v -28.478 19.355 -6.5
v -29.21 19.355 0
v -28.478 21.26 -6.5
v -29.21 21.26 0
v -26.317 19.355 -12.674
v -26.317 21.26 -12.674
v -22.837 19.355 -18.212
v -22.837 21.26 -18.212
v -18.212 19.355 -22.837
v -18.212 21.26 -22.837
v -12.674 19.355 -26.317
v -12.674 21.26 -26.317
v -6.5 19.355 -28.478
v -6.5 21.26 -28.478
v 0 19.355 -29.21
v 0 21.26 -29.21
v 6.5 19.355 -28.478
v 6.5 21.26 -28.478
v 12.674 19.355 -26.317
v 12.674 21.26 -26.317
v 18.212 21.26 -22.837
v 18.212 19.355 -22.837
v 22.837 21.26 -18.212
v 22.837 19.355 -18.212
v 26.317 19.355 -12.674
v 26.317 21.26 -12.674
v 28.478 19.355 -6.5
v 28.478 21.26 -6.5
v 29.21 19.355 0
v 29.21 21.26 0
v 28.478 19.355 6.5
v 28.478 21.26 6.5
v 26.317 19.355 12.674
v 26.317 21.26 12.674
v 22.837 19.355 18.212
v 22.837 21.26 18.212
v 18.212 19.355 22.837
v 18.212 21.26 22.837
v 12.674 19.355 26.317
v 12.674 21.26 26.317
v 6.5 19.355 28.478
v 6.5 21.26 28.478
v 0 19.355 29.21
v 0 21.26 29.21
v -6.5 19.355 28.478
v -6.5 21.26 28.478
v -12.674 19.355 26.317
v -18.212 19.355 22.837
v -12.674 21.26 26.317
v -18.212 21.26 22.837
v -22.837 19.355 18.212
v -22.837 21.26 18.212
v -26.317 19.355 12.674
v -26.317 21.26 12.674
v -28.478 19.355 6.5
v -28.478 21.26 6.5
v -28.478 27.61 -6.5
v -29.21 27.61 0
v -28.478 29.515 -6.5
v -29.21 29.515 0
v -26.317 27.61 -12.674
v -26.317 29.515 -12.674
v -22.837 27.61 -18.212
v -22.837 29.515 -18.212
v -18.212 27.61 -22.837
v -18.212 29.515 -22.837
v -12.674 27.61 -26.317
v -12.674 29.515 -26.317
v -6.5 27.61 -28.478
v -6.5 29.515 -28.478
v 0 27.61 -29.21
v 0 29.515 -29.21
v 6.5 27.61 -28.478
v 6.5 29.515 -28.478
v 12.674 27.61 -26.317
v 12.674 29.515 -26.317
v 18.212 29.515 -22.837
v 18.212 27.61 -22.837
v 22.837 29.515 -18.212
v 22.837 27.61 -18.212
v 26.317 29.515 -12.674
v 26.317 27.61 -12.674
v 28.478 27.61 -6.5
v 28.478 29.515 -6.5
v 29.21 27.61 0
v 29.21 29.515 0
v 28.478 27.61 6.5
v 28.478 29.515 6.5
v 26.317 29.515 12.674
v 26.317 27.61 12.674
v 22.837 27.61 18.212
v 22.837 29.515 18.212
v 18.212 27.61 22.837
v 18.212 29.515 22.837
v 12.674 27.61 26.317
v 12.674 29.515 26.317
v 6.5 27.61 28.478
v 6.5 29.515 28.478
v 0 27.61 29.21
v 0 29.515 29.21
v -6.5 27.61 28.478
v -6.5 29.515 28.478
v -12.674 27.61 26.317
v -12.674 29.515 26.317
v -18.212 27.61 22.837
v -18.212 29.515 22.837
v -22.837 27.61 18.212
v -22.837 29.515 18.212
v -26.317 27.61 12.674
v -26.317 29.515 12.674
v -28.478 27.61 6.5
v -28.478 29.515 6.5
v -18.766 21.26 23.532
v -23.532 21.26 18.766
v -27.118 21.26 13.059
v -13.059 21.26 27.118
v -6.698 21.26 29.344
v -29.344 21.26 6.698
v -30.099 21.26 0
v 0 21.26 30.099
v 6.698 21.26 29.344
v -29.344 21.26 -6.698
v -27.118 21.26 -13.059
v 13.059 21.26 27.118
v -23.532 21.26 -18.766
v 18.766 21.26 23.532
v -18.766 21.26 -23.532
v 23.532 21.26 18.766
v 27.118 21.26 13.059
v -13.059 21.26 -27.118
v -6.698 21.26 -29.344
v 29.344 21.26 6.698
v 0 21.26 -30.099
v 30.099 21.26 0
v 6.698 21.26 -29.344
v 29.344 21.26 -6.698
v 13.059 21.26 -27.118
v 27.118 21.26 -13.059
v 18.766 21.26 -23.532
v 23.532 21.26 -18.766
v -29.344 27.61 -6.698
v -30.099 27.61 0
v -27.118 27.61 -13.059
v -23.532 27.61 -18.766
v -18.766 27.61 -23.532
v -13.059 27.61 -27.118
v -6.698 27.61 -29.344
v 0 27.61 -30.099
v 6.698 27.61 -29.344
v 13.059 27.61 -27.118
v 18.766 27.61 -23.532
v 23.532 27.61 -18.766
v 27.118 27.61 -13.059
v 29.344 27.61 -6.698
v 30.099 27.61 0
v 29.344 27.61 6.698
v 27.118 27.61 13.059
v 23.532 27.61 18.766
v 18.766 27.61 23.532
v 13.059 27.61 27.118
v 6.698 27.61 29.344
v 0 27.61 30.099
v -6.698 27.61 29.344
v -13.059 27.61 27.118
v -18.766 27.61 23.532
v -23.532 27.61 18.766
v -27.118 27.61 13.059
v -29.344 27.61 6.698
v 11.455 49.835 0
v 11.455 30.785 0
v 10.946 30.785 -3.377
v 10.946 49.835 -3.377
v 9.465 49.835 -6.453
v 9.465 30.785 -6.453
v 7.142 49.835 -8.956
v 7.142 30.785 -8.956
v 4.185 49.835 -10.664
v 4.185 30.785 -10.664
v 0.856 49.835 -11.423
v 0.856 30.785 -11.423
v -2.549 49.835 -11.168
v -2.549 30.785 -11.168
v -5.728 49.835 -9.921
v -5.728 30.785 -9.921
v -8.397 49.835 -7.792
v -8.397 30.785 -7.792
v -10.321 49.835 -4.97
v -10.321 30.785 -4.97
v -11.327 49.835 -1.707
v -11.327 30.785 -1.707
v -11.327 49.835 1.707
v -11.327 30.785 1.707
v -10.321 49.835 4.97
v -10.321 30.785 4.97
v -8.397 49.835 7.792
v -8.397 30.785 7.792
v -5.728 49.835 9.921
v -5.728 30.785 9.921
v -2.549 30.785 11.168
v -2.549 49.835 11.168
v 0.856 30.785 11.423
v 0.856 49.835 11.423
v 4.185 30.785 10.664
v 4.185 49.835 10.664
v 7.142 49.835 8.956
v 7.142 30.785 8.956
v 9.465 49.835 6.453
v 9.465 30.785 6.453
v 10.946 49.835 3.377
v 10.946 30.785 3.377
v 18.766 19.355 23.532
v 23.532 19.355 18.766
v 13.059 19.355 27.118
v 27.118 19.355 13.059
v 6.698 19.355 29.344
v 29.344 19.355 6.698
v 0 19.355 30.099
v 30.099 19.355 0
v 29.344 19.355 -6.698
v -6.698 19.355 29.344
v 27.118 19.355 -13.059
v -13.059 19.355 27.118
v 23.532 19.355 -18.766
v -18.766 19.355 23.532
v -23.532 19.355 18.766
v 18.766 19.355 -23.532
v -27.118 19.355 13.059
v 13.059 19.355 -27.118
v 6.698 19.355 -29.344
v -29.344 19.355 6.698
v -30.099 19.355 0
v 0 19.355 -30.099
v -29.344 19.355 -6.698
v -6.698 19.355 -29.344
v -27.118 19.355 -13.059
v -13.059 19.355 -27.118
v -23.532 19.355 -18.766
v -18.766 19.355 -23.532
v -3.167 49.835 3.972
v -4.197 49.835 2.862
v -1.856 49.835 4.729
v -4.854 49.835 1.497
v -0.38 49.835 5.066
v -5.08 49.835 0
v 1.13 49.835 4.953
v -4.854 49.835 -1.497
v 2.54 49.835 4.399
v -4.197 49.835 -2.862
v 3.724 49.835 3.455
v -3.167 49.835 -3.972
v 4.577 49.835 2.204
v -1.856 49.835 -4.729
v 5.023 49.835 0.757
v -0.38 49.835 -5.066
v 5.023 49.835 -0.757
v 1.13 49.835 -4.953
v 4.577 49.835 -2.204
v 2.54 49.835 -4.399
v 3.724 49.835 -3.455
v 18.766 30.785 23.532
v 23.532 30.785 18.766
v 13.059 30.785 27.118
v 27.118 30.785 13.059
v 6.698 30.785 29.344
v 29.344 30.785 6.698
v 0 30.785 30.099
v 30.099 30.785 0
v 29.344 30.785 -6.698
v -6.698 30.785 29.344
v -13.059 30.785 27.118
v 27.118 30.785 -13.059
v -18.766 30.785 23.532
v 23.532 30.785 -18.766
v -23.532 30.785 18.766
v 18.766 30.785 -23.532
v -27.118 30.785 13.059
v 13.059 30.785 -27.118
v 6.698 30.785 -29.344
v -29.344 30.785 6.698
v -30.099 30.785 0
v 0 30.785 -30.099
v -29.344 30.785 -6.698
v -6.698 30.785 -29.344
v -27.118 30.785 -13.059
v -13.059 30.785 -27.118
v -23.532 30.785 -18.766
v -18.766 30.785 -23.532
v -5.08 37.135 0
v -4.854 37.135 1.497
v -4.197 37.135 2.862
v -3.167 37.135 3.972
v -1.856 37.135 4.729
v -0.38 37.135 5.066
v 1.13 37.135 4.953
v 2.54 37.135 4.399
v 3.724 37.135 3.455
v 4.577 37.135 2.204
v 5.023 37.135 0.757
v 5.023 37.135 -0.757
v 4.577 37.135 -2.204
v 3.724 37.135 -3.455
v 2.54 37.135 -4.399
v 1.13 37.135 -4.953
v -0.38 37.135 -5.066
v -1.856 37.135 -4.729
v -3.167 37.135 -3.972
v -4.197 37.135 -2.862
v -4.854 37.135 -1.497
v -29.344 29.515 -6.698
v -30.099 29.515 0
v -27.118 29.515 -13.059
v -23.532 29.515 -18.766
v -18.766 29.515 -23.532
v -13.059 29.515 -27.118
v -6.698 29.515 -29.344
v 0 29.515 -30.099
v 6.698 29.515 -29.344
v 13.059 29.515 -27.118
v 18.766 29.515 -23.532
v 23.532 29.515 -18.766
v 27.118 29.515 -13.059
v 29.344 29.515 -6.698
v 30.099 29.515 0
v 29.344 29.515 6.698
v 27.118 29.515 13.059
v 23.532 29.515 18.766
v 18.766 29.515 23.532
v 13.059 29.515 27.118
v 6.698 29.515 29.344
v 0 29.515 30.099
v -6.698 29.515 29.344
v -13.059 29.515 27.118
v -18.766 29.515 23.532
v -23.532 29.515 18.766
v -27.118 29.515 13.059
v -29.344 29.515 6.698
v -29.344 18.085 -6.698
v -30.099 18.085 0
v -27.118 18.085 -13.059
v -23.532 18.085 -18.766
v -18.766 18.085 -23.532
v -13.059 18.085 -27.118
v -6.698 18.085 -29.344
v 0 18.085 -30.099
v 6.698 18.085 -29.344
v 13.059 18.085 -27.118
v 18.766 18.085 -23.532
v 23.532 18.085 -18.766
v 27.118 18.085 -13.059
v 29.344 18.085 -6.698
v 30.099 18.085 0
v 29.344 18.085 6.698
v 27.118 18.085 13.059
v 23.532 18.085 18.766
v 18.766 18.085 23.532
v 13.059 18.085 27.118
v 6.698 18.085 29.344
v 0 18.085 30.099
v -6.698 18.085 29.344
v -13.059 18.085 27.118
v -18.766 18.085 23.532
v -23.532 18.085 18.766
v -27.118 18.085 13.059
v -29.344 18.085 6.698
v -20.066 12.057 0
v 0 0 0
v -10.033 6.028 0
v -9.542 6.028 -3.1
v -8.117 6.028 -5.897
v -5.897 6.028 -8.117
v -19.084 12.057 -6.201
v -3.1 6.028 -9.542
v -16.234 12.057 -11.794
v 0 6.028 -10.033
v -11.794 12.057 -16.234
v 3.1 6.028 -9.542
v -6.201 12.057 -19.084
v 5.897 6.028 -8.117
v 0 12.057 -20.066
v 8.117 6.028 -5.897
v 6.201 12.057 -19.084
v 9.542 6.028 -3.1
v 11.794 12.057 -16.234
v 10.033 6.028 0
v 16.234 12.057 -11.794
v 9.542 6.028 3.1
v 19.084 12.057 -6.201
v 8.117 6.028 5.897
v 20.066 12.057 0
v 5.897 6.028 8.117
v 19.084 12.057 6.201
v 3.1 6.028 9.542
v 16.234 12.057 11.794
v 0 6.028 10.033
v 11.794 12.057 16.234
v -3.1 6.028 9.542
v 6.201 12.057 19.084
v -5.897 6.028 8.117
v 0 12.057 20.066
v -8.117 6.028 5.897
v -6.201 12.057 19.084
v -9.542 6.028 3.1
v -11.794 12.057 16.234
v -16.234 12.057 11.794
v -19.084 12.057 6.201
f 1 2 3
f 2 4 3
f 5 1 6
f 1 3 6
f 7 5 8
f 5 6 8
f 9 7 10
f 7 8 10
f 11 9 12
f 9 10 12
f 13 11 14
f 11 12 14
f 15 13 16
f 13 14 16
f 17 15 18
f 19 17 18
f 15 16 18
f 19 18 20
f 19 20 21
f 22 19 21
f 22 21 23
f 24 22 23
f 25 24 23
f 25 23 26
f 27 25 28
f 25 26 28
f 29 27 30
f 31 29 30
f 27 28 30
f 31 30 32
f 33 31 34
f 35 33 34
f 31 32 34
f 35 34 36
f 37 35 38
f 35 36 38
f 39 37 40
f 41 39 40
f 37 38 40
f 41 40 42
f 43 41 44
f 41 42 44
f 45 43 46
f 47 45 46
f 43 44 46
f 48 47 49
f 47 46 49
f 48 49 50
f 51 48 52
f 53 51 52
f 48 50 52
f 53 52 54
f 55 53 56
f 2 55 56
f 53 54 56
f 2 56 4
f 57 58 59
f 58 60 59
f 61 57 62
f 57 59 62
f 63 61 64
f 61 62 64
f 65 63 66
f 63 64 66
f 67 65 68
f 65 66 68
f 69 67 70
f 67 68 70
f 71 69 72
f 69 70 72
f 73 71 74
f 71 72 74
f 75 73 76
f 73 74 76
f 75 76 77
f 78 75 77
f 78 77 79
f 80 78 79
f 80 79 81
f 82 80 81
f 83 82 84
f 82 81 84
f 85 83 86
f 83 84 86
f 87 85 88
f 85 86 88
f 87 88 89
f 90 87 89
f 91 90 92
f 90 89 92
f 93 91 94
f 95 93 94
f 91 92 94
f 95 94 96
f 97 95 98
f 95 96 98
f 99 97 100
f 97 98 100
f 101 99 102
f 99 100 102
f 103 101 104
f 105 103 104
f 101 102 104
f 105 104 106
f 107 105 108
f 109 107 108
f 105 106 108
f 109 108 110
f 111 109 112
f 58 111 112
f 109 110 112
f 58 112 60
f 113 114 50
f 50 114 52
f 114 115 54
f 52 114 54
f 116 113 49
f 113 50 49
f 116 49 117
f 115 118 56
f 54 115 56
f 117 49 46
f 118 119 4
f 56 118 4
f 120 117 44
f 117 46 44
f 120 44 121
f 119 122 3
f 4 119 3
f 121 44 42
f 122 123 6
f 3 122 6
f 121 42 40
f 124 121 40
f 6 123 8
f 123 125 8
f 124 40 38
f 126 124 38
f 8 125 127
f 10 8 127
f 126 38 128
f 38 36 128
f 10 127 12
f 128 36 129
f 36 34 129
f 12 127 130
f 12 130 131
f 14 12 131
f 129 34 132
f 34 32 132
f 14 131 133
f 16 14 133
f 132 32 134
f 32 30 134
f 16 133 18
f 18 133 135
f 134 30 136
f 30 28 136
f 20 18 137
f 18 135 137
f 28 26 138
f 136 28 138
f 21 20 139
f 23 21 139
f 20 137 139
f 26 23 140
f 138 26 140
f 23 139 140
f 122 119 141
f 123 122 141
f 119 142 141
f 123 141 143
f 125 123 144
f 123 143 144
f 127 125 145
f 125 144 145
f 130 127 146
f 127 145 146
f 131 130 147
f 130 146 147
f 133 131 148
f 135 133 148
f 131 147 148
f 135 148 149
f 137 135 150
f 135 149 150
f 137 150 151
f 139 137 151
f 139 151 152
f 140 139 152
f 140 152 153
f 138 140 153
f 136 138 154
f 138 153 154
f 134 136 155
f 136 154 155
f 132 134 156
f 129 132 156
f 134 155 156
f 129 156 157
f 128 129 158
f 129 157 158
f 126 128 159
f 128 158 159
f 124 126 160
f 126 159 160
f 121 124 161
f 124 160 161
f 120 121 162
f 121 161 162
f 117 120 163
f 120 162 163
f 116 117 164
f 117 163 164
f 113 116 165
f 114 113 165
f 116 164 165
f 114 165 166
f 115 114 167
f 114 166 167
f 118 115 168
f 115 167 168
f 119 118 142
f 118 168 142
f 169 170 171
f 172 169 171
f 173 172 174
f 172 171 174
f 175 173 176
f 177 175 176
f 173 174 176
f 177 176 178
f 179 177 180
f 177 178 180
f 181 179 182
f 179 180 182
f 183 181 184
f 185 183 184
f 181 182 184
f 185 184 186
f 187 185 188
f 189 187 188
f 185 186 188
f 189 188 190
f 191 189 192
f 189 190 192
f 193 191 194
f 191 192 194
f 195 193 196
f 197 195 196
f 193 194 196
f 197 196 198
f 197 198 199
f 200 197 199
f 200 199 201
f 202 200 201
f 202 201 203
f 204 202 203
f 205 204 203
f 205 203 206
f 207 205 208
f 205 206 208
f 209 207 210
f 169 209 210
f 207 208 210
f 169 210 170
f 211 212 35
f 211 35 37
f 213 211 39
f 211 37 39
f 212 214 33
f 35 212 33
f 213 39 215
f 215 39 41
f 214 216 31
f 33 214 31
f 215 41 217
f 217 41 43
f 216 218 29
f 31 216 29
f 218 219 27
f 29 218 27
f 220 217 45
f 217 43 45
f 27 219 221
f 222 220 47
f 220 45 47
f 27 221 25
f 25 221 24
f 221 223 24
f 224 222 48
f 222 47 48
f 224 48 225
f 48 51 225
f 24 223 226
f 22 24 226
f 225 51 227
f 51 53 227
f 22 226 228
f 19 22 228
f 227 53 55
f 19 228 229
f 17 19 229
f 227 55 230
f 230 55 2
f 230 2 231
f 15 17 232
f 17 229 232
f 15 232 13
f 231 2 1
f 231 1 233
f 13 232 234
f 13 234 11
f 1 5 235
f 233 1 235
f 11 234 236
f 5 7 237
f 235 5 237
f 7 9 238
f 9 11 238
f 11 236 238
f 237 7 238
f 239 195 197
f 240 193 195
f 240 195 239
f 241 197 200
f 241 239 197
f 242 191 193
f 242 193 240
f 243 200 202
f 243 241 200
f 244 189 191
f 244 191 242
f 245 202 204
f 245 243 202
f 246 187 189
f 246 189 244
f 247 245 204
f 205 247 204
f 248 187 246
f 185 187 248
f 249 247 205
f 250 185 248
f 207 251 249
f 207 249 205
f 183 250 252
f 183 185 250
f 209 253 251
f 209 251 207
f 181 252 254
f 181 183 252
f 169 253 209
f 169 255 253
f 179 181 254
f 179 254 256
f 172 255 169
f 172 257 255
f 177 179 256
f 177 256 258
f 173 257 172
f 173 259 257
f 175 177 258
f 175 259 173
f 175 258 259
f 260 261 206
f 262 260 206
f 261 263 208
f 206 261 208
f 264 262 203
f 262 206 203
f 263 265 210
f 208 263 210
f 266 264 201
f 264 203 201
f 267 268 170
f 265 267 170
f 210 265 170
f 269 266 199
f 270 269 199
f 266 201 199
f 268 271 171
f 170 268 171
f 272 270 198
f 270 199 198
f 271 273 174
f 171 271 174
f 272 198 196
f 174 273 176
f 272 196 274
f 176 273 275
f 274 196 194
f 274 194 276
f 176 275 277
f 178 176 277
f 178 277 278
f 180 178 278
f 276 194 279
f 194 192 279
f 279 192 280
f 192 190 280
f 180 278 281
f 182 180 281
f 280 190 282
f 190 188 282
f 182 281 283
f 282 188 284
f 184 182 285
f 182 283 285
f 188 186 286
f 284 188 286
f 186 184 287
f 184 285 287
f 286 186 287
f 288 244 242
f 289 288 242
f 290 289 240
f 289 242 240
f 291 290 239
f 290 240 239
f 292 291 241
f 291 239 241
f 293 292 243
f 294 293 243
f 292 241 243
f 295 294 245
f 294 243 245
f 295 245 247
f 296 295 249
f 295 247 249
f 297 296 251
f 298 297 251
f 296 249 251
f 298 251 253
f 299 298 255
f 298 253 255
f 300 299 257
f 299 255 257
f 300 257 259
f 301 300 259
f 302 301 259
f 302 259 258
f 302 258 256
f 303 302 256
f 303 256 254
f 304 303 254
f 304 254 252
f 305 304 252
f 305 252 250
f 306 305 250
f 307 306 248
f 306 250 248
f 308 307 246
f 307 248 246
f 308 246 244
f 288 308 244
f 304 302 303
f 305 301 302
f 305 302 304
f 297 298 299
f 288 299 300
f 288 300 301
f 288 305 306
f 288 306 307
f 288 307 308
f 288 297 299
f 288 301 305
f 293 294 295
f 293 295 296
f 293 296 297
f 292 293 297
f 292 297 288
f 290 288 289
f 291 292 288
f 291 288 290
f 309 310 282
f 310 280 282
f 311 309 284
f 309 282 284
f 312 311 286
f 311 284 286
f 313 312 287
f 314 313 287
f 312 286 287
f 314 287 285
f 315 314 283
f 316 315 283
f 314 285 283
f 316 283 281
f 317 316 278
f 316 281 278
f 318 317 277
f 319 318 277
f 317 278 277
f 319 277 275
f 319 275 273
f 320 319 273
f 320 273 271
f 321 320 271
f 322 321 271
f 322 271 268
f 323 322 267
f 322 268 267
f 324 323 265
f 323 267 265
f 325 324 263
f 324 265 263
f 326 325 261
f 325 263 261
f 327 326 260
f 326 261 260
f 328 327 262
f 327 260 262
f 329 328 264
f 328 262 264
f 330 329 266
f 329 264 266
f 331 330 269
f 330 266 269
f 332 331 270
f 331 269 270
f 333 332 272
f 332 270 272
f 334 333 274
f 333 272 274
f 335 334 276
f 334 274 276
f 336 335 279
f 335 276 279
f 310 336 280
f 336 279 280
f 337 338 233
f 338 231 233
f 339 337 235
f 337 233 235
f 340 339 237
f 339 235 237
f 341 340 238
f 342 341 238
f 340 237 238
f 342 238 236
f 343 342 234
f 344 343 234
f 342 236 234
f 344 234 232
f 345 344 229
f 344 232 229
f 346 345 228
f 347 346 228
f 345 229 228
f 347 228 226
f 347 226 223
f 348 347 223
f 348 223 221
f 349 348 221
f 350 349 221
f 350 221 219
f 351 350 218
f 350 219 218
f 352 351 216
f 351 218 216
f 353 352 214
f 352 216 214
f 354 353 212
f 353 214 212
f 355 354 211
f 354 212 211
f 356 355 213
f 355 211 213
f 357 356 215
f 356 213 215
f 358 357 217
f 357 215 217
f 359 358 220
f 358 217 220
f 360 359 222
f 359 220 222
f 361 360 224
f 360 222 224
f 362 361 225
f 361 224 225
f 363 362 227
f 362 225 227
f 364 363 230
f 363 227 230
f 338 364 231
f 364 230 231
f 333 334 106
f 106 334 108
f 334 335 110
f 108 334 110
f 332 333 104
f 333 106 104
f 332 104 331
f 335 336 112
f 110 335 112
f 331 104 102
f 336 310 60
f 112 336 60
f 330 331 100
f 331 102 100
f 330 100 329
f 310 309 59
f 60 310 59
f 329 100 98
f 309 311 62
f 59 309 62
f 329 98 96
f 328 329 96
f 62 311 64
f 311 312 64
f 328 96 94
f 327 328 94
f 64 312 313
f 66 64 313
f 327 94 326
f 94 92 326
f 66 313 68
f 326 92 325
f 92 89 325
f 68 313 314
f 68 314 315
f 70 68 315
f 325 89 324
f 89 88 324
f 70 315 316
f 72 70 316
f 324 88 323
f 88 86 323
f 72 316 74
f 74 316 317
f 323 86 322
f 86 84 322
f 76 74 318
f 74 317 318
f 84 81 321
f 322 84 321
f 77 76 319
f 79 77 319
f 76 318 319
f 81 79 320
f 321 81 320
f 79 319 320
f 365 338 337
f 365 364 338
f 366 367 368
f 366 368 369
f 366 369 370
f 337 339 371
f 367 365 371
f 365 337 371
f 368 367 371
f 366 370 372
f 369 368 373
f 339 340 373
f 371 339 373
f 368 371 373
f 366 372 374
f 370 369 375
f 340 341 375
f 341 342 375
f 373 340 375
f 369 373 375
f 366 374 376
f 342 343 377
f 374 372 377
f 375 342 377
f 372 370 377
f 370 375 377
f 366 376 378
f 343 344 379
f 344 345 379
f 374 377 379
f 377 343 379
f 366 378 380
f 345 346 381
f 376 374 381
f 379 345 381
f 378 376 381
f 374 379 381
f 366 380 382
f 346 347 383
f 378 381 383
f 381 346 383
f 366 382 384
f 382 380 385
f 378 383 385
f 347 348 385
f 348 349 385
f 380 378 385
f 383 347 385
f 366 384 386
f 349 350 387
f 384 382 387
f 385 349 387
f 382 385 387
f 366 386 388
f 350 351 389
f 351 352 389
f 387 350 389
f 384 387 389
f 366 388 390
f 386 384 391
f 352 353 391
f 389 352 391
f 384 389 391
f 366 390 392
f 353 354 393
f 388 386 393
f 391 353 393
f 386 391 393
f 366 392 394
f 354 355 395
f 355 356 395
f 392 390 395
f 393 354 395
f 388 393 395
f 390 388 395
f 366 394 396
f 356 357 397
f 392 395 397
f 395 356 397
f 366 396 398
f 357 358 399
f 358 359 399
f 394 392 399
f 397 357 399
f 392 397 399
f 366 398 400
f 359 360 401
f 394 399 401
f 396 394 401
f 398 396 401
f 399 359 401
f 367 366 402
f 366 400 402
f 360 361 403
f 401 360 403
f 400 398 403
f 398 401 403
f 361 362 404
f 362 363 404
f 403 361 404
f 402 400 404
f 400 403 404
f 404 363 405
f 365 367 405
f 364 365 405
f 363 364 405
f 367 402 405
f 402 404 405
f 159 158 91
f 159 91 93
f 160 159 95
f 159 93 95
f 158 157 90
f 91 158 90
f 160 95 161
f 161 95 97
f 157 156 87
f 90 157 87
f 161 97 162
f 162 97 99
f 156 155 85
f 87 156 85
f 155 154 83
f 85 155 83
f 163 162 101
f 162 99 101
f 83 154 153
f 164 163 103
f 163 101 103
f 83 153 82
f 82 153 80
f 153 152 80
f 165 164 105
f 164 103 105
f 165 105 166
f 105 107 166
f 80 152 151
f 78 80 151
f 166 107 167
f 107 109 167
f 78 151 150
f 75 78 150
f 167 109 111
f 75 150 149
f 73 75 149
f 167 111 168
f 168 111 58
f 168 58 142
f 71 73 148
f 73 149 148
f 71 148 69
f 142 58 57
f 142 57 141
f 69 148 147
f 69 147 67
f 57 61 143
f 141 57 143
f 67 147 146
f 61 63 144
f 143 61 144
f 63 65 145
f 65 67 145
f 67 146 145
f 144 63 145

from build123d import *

# Parameters (mm, degrees)
SKETCH2_R           = 11.4554
BOSS_EXTRUDE1_DEPTH = 19.05
SKETCH3_R           = 5.08
CUT_EXTRUDE1_DEPTH  = 12.7


with BuildPart() as part:
    # Sketch1 → Revolve1 (revolve)
    with BuildSketch(Plane.XY, mode=Mode.PRIVATE) as revolve1_sk:
        Polygon((0, 19.05), (0, 0), (30.099, 18.085303772), (30.099, 19.355303772), (29.21, 19.355303772), (29.21, 21.260303772), (30.099, 21.260303772), (30.099, 27.610303772), (29.21, 27.610303772), (29.21, 29.515303772), (30.099, 29.515303772), (30.099, 30.785303772), (0, 30.785303772), align=None)
    revolve(revolve1_sk.sketch.rotate(Axis((0, 30.785303772, 0), (0, -1, 0)), 180), axis=Axis((0, 30.785303772, 0), (0, -1, 0)))

    # Sketch2 → Boss-Extrude1 (add)
    with BuildSketch(Plane(origin=(0, 30.785303772, 0), x_dir=(1, 0, 0), z_dir=(0, 1, 0))):
        Circle(SKETCH2_R)
    extrude(amount=BOSS_EXTRUDE1_DEPTH)

    # Sketch3 → Cut-Extrude1 (cut)
    with BuildSketch(Plane(origin=(0, 49.835303772, 0), x_dir=(1, 0, 0), z_dir=(0, 1, 0))):
        with Locations(Location((0, 0, 0), (0, 0, 180))):
            Circle(SKETCH3_R)
    extrude(amount=-CUT_EXTRUDE1_DEPTH, mode=Mode.SUBTRACT)


solid = part.part
